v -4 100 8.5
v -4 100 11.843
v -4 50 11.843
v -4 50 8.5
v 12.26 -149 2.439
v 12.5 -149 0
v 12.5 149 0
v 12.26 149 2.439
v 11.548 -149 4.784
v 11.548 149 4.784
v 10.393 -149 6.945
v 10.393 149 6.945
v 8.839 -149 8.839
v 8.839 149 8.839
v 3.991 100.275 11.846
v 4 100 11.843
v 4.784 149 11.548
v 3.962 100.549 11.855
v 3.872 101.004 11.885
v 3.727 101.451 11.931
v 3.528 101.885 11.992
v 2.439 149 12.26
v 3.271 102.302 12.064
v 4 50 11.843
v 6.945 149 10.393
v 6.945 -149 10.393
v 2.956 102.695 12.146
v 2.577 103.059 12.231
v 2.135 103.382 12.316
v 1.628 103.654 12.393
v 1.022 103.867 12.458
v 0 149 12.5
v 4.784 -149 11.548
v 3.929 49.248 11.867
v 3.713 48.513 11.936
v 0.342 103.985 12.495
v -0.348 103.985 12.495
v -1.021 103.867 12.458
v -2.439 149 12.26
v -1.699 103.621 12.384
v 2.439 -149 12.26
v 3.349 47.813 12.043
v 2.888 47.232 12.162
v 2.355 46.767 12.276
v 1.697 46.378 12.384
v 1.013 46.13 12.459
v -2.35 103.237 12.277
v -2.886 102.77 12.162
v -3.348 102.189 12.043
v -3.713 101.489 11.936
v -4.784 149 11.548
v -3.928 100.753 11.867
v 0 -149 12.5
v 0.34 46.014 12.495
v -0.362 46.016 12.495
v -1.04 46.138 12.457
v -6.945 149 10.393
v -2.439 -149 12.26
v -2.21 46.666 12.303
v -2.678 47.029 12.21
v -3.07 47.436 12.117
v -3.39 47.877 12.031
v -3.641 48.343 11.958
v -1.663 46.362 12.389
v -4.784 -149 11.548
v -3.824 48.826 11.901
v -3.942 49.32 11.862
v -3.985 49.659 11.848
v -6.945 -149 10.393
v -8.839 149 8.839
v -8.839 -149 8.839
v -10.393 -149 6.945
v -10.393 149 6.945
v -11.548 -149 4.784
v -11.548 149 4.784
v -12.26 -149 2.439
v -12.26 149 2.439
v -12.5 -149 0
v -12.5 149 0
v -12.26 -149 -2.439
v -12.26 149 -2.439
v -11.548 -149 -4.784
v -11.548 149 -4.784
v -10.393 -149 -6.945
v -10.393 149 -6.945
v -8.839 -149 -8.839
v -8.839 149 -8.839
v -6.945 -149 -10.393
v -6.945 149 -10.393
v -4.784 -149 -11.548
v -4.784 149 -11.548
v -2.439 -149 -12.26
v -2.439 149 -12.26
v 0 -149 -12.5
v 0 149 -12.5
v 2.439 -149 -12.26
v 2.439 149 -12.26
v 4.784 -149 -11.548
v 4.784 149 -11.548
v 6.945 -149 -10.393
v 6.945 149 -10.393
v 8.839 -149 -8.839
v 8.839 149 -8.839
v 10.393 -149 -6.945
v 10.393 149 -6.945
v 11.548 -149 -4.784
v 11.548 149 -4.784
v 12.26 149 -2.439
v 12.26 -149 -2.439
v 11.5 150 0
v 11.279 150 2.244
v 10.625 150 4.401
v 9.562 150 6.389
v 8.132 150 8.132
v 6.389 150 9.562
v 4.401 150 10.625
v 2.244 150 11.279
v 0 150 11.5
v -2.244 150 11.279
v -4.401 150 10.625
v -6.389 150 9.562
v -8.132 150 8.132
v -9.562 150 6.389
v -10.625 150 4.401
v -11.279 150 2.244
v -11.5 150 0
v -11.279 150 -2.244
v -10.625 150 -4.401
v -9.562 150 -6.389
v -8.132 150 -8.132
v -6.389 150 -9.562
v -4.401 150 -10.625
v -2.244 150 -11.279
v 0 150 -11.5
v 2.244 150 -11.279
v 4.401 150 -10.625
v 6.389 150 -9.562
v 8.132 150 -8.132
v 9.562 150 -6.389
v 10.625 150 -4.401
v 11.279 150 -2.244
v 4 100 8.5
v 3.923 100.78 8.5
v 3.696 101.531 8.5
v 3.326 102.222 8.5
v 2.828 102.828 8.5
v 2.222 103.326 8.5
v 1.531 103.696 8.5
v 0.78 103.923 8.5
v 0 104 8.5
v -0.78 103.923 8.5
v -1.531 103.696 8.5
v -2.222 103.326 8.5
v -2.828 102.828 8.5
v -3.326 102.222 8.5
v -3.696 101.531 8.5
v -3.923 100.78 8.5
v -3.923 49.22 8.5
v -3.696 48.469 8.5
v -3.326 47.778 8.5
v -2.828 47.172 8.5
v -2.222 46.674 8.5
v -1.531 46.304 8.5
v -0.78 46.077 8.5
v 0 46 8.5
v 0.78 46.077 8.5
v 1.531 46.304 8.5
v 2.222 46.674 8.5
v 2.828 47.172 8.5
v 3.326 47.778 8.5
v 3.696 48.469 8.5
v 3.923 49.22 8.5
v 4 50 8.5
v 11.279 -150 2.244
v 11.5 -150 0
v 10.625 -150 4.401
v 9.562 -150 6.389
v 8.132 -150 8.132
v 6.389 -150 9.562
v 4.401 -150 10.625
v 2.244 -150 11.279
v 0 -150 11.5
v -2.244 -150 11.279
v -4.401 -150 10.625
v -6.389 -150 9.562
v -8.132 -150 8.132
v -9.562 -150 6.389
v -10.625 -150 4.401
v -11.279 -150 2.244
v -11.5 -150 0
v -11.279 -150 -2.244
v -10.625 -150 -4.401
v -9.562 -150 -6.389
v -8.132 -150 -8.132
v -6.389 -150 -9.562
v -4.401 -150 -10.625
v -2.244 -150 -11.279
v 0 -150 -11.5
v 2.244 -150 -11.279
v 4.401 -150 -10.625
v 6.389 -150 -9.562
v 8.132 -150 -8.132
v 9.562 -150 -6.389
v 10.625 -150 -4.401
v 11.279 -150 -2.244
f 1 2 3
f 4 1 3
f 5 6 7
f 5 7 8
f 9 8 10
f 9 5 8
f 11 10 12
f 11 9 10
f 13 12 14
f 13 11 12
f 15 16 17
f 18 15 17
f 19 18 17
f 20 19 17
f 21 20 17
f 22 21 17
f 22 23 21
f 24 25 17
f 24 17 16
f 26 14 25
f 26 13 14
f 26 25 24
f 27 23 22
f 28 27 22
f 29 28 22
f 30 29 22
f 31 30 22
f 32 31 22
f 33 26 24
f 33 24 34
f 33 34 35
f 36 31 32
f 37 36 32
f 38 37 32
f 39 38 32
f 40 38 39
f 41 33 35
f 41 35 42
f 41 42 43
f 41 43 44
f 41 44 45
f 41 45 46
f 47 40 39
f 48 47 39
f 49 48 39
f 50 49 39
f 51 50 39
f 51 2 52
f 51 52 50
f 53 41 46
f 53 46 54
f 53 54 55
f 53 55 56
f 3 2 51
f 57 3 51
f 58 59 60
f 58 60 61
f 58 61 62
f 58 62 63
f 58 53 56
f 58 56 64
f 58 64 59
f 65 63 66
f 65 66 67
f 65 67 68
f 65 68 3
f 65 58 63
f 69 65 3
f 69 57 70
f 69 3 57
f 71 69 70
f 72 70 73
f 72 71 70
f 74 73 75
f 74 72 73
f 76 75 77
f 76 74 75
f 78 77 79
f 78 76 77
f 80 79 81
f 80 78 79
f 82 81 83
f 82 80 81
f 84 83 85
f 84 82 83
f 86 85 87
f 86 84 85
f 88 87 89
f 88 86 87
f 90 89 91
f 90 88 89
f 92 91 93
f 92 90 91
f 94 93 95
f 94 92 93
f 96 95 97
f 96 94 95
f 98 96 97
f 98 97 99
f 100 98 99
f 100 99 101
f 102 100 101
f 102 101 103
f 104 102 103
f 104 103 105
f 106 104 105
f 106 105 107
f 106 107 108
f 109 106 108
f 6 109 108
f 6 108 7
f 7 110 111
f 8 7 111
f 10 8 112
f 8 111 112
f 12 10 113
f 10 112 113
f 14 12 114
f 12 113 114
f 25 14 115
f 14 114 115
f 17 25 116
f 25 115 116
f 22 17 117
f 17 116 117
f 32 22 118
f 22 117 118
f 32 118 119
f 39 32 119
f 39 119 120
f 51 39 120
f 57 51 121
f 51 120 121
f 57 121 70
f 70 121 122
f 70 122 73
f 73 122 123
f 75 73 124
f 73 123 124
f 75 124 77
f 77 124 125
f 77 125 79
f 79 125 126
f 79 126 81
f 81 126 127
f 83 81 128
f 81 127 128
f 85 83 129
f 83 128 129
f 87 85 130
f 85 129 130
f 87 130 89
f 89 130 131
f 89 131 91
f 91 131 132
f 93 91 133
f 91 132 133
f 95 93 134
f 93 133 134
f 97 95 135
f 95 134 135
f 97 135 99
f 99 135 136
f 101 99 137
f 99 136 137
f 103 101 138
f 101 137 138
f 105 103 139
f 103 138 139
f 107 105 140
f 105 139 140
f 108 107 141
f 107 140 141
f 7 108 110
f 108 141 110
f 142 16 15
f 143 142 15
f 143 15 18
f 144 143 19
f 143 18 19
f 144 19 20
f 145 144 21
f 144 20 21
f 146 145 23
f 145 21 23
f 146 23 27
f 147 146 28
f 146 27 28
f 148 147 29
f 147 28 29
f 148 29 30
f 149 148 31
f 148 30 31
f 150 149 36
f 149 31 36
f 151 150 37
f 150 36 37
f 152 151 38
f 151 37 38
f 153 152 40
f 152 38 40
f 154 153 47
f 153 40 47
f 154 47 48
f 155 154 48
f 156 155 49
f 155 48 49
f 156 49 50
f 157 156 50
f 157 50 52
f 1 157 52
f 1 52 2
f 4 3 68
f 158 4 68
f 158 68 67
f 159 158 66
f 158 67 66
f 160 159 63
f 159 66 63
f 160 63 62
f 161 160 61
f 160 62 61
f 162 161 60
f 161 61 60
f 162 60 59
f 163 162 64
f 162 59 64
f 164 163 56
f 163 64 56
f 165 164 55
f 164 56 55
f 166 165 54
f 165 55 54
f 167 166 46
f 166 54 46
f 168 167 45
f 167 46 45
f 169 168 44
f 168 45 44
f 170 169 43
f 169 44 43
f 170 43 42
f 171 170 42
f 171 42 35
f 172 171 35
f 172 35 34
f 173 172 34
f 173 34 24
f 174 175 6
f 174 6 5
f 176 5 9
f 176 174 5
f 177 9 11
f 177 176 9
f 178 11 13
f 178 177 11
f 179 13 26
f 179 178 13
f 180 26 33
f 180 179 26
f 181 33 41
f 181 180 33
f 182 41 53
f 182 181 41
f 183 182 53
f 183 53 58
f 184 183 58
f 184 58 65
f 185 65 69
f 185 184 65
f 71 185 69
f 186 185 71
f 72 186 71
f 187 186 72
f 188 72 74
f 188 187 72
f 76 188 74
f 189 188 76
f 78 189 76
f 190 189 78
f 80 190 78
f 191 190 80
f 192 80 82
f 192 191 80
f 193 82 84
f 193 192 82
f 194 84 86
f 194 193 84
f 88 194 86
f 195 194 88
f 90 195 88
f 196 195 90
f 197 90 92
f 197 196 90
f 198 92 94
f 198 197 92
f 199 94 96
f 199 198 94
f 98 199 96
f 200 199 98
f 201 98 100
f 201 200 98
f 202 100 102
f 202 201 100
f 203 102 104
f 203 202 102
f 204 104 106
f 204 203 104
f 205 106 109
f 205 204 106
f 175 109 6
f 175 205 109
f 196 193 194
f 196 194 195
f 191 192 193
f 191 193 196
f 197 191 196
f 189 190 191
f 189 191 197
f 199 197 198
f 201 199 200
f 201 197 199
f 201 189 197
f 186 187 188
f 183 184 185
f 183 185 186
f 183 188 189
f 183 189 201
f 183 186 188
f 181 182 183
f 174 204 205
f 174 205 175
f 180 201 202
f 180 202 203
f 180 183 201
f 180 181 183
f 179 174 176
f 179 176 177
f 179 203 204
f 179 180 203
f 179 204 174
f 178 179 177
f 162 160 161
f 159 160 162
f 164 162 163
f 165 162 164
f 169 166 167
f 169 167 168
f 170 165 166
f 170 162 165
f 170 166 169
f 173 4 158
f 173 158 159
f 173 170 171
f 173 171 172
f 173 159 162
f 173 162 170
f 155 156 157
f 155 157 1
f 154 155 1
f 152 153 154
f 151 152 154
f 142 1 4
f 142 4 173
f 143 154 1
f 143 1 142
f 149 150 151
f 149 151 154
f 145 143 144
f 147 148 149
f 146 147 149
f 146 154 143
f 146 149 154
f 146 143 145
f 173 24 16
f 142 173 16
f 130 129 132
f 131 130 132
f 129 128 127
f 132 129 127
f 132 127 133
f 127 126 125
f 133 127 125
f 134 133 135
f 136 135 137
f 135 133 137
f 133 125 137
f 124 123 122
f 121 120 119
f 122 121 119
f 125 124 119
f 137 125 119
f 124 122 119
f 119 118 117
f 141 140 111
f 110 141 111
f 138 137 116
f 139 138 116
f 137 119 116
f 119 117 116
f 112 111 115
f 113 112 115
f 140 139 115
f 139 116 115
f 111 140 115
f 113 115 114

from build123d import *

# Parameters (mm, degrees)
F0_R     = 12.5
F1_DEPTH = 150
F4_DEPTH = 4
F5_SIZE  = 1


with BuildPart() as f1:
    # F0 (on Front) → F1 (new body, symmetric)
    with BuildSketch(Plane.XZ):
        Circle(F0_R)
    extrude(amount=F1_DEPTH, both=True)

    # F3 (on offset) → F4 (cut)
    with BuildSketch(Plane.XY.offset(12.5)):
        with BuildLine():
            Line((4, 50), (4, 100))
            ThreePointArc((4, 100), (0, 104), (-4, 100))
            Line((-4, 100), (-4, 50))
            ThreePointArc((-4, 50), (0, 46), (4, 50))
        make_face()
    extrude(amount=-F4_DEPTH, mode=Mode.SUBTRACT)

    # F5
    f5_edges = [f1.edges().sort_by_distance(p)[0] for p in [
        (-12.5, 150, 0),
        (-12.5, -150, 0),
    ]]
    chamfer(f5_edges, length=F5_SIZE)


solid = f1.part
